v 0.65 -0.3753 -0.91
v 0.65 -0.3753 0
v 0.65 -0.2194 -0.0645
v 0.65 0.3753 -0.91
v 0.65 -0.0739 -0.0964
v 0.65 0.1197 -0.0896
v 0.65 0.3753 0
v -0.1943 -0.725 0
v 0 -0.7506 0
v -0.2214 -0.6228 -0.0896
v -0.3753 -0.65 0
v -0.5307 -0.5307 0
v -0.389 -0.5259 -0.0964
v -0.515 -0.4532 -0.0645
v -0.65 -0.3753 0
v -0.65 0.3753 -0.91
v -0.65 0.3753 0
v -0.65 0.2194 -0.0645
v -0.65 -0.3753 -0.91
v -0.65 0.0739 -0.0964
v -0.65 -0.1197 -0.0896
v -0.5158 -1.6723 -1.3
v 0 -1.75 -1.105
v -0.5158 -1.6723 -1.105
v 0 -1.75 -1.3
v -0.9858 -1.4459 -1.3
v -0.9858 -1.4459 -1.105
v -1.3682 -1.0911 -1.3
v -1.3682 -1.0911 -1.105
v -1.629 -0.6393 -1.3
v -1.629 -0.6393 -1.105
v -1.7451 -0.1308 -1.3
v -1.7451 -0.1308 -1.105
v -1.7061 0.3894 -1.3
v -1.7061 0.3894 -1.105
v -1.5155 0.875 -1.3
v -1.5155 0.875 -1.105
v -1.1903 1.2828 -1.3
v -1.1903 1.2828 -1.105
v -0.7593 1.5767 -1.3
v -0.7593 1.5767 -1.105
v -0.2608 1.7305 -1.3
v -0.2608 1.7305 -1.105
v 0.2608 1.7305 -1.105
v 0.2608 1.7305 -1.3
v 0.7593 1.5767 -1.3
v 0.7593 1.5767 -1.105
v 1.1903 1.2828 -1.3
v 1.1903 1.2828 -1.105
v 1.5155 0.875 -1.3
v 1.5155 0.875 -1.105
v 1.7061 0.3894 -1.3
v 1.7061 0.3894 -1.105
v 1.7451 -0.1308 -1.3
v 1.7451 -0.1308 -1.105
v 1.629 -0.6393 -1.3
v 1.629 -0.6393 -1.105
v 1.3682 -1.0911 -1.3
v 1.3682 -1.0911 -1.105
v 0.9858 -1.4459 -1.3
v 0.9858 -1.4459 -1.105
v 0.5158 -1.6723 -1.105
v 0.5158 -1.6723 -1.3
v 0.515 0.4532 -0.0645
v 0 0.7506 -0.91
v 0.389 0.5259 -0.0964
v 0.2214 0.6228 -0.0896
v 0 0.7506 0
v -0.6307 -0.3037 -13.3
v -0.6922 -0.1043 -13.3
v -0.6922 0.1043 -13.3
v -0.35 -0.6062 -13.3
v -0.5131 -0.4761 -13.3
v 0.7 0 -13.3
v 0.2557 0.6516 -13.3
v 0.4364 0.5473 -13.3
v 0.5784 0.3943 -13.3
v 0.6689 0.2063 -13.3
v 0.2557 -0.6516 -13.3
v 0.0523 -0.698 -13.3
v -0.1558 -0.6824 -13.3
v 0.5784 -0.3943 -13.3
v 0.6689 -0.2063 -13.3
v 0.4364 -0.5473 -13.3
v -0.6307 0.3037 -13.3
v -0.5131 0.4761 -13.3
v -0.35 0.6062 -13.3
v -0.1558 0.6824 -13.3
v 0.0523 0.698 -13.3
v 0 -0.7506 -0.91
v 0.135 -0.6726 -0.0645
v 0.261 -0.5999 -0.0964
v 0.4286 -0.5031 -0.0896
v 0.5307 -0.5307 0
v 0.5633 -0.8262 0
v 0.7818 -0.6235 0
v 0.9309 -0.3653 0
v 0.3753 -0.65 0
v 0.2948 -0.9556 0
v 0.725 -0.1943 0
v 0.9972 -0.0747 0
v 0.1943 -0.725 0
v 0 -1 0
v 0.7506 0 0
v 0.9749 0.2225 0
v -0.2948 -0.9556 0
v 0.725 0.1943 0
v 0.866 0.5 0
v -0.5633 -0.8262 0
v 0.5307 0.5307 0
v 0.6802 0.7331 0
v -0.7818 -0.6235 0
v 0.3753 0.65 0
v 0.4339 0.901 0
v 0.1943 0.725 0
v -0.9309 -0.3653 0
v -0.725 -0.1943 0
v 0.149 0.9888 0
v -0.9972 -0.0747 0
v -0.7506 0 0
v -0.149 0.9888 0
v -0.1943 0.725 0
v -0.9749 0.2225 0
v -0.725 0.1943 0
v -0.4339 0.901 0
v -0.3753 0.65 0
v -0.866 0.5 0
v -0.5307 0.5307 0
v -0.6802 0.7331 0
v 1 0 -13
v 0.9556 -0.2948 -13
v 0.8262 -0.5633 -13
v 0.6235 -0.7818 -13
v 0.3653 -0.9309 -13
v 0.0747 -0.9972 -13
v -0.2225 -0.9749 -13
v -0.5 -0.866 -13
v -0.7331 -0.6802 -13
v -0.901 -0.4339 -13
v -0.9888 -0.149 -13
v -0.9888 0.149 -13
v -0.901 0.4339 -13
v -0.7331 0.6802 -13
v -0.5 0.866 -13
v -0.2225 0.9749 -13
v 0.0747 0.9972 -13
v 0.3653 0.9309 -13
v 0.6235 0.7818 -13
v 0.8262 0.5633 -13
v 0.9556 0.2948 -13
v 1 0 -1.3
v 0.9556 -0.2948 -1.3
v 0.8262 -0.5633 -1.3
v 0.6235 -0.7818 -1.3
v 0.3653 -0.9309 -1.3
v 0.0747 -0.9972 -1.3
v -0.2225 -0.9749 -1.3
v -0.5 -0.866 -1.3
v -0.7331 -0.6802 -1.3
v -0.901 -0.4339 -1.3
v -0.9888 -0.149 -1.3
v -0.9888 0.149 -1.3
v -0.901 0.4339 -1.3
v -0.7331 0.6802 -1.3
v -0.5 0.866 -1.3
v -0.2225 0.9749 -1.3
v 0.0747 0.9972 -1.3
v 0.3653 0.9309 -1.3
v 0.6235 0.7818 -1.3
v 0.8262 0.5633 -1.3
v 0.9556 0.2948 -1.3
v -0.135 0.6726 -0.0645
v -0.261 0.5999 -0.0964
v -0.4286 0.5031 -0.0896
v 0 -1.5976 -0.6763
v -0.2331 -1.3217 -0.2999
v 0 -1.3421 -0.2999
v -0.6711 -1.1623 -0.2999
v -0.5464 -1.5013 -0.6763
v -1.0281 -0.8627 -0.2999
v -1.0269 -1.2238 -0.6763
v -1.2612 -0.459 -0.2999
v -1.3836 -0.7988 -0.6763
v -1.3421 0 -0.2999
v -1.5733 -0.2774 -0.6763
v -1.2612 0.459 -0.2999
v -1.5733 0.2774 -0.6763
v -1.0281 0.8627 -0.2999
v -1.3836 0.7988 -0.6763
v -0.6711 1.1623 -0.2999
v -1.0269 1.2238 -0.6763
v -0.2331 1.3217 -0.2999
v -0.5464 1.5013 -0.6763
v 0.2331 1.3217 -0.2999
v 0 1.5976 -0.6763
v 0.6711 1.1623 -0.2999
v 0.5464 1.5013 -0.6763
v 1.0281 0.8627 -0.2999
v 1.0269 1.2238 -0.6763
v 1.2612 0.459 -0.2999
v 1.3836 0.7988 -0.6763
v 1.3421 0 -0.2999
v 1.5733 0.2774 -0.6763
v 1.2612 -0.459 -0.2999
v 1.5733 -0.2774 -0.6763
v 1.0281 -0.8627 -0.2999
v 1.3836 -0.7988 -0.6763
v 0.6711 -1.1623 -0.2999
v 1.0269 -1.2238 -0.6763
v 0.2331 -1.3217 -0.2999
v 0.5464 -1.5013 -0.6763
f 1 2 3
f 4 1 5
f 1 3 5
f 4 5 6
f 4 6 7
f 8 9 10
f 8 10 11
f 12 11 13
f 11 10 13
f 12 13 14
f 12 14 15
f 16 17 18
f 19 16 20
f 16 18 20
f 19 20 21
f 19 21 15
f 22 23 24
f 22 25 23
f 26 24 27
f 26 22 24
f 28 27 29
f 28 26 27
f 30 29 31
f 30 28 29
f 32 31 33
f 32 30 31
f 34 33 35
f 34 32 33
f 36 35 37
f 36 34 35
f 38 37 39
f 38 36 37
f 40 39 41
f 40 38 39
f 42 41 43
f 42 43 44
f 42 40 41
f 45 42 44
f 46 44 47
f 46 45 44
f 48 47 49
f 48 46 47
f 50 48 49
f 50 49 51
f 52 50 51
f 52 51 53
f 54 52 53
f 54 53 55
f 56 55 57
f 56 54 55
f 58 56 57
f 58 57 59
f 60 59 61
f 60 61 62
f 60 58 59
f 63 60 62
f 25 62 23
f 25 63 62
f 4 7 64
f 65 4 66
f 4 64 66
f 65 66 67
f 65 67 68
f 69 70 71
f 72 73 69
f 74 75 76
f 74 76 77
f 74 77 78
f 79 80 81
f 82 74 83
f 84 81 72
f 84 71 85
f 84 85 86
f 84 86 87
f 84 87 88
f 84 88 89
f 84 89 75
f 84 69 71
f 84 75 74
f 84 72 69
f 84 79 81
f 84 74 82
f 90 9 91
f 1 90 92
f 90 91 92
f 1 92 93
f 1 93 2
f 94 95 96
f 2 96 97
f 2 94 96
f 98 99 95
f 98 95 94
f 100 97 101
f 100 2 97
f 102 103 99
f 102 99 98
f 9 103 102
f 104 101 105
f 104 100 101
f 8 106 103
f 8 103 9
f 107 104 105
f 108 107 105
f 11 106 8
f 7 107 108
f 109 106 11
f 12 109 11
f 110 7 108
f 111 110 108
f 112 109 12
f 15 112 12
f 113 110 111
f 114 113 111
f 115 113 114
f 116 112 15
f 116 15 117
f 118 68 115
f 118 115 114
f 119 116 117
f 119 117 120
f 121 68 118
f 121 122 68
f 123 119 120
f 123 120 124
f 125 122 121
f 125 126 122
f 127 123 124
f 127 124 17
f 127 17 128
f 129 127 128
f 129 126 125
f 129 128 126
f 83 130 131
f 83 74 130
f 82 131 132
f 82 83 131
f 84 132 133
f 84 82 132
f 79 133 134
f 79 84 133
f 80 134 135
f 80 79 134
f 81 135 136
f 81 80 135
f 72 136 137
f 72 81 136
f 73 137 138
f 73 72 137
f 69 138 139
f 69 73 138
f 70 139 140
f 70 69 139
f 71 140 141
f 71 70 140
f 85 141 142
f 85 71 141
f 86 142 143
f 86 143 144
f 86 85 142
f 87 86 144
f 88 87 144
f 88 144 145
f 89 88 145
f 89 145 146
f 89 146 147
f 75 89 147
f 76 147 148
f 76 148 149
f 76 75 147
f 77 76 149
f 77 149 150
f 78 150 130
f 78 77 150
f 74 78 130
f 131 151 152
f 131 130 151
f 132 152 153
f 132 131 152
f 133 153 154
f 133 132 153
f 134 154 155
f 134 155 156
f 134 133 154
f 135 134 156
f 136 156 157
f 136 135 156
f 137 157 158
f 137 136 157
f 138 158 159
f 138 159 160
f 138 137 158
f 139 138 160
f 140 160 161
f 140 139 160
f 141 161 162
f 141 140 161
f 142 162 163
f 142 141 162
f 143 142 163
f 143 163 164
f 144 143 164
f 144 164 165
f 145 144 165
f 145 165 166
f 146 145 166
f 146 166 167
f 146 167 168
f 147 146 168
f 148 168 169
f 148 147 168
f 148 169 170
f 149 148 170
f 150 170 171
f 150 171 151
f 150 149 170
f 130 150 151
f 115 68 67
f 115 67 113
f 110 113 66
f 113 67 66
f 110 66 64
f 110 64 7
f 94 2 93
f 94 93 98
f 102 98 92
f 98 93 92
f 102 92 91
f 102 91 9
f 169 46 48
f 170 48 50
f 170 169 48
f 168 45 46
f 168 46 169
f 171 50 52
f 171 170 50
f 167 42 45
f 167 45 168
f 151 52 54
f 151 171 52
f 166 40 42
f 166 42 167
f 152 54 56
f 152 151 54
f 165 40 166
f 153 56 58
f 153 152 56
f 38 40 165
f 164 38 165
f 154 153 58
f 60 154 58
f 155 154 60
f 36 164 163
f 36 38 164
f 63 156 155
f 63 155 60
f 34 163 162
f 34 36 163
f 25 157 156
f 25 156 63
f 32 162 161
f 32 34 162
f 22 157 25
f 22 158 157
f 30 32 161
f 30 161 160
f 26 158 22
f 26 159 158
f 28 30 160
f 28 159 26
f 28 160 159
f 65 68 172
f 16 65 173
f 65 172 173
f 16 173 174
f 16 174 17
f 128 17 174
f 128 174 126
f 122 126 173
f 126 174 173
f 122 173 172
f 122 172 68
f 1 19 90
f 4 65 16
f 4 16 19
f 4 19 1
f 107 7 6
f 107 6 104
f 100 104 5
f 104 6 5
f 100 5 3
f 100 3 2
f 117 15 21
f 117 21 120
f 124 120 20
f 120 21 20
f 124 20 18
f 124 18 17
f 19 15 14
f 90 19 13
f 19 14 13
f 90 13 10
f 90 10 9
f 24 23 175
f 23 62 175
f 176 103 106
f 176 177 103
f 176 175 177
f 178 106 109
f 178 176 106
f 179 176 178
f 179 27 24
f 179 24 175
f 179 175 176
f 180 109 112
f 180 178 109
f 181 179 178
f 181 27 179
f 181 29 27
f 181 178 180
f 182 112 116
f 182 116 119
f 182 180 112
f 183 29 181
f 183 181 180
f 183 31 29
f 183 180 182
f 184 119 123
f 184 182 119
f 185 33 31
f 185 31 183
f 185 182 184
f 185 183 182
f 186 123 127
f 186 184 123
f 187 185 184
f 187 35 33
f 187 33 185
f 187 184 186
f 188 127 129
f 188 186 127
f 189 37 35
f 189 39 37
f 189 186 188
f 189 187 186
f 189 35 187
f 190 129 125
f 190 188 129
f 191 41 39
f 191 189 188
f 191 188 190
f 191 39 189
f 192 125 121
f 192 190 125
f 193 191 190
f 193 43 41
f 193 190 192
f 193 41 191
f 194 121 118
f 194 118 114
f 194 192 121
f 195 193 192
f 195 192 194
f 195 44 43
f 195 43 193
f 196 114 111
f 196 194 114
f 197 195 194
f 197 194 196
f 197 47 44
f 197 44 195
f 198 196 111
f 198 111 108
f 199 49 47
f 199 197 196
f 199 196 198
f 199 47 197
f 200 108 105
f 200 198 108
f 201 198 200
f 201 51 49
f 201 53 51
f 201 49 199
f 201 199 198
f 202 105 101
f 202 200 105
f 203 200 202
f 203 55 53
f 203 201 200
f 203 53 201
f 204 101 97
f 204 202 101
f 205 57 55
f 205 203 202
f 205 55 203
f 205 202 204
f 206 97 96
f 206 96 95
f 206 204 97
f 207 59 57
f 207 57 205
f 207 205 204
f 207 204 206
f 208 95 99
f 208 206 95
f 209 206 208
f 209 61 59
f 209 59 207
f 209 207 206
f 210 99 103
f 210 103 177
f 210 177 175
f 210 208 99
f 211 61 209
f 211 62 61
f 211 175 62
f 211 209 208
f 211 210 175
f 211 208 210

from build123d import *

# Parameters (mm, degrees)
CUT_EXTRUDE2_DEPTH = 0.91


with BuildPart() as part:
    # Sketch10 → Revolve3 (revolve)
    with BuildSketch(Plane(origin=(0, 0, 0), x_dir=(0, 0, -1), z_dir=(1, 0, 0)), mode=Mode.PRIVATE) as revolve3_sk:
        Polygon((13, 1), (13.3, 0.7), (13.3, 0), (1.3, 0), (1.3, 1), align=None)
    revolve(revolve3_sk.sketch.rotate(Axis((0, 0, 0), (0, 0, -1)), 90), axis=Axis((0, 0, 0), (0, 0, -1)))

    # Sketch7 → Revolve2 (revolve)
    with BuildSketch(Plane(origin=(0, 0, 0), x_dir=(0, 0, -1), z_dir=(1, 0, 0)), mode=Mode.PRIVATE) as revolve2_sk:
        with BuildLine():
            Line((1.105, 1.75), (1.3, 1.75))
            Line((1.3, 1.75), (1.3, 0))
            Line((1.3, 0), (0, 0))
            Line((0, 0), (0, 1))
            ThreePointArc((0, 1), (0.479976957, 1.481850617), (1.105, 1.75))
        make_face()
    revolve(revolve2_sk.sketch.rotate(Axis((0, 0, 0), (0, 0, -1)), 180), axis=Axis((0, 0, 0), (0, 0, -1)))

    # Sketch5 → Cut-Extrude2 (cut)
    with BuildSketch(Plane.XY):
        Polygon((0.65, -0.375277675), (0.65, 0.375277675), (0, 0.75055535), (-0.65, 0.375277675), (-0.65, -0.375277675), (0, -0.75055535), align=None)
    extrude(amount=-CUT_EXTRUDE2_DEPTH, mode=Mode.SUBTRACT)

    # Cut-Extrude3 cone 1 section (through the dimple's axis) → Cut-Extrude3 (revolve, cut)
    with BuildSketch(Plane(origin=(0, 0, 0), x_dir=(0, -1, 0), z_dir=(1, 0, 0))):
        Polygon((0, 0), (0.75055535, 0), (0, 0.75055535), align=None)
    revolve(axis=Axis((0, 0, 0), (0, 0, -1)), mode=Mode.SUBTRACT)


with BuildPart() as body_2:
    # Split1: read off the stored shape, not the designer's step
    # Split1: the piece on the far side of the plane
    add(part.part)
    split(bisect_by=Plane.XY.offset(-1.3), keep=Keep.BOTTOM)


with BuildPart() as part_1:
    add(part.part)

    # Split1
    split(bisect_by=Plane.XY.offset(-1.3), keep=Keep.TOP)


with BuildPart() as body_2_1:
    add(body_2.part)

    # Boss-Extrude1: read off the stored shape, not the designer's step
    # Boss-Extrude1: union part
    add(part_1.part)


solid = body_2_1.part
